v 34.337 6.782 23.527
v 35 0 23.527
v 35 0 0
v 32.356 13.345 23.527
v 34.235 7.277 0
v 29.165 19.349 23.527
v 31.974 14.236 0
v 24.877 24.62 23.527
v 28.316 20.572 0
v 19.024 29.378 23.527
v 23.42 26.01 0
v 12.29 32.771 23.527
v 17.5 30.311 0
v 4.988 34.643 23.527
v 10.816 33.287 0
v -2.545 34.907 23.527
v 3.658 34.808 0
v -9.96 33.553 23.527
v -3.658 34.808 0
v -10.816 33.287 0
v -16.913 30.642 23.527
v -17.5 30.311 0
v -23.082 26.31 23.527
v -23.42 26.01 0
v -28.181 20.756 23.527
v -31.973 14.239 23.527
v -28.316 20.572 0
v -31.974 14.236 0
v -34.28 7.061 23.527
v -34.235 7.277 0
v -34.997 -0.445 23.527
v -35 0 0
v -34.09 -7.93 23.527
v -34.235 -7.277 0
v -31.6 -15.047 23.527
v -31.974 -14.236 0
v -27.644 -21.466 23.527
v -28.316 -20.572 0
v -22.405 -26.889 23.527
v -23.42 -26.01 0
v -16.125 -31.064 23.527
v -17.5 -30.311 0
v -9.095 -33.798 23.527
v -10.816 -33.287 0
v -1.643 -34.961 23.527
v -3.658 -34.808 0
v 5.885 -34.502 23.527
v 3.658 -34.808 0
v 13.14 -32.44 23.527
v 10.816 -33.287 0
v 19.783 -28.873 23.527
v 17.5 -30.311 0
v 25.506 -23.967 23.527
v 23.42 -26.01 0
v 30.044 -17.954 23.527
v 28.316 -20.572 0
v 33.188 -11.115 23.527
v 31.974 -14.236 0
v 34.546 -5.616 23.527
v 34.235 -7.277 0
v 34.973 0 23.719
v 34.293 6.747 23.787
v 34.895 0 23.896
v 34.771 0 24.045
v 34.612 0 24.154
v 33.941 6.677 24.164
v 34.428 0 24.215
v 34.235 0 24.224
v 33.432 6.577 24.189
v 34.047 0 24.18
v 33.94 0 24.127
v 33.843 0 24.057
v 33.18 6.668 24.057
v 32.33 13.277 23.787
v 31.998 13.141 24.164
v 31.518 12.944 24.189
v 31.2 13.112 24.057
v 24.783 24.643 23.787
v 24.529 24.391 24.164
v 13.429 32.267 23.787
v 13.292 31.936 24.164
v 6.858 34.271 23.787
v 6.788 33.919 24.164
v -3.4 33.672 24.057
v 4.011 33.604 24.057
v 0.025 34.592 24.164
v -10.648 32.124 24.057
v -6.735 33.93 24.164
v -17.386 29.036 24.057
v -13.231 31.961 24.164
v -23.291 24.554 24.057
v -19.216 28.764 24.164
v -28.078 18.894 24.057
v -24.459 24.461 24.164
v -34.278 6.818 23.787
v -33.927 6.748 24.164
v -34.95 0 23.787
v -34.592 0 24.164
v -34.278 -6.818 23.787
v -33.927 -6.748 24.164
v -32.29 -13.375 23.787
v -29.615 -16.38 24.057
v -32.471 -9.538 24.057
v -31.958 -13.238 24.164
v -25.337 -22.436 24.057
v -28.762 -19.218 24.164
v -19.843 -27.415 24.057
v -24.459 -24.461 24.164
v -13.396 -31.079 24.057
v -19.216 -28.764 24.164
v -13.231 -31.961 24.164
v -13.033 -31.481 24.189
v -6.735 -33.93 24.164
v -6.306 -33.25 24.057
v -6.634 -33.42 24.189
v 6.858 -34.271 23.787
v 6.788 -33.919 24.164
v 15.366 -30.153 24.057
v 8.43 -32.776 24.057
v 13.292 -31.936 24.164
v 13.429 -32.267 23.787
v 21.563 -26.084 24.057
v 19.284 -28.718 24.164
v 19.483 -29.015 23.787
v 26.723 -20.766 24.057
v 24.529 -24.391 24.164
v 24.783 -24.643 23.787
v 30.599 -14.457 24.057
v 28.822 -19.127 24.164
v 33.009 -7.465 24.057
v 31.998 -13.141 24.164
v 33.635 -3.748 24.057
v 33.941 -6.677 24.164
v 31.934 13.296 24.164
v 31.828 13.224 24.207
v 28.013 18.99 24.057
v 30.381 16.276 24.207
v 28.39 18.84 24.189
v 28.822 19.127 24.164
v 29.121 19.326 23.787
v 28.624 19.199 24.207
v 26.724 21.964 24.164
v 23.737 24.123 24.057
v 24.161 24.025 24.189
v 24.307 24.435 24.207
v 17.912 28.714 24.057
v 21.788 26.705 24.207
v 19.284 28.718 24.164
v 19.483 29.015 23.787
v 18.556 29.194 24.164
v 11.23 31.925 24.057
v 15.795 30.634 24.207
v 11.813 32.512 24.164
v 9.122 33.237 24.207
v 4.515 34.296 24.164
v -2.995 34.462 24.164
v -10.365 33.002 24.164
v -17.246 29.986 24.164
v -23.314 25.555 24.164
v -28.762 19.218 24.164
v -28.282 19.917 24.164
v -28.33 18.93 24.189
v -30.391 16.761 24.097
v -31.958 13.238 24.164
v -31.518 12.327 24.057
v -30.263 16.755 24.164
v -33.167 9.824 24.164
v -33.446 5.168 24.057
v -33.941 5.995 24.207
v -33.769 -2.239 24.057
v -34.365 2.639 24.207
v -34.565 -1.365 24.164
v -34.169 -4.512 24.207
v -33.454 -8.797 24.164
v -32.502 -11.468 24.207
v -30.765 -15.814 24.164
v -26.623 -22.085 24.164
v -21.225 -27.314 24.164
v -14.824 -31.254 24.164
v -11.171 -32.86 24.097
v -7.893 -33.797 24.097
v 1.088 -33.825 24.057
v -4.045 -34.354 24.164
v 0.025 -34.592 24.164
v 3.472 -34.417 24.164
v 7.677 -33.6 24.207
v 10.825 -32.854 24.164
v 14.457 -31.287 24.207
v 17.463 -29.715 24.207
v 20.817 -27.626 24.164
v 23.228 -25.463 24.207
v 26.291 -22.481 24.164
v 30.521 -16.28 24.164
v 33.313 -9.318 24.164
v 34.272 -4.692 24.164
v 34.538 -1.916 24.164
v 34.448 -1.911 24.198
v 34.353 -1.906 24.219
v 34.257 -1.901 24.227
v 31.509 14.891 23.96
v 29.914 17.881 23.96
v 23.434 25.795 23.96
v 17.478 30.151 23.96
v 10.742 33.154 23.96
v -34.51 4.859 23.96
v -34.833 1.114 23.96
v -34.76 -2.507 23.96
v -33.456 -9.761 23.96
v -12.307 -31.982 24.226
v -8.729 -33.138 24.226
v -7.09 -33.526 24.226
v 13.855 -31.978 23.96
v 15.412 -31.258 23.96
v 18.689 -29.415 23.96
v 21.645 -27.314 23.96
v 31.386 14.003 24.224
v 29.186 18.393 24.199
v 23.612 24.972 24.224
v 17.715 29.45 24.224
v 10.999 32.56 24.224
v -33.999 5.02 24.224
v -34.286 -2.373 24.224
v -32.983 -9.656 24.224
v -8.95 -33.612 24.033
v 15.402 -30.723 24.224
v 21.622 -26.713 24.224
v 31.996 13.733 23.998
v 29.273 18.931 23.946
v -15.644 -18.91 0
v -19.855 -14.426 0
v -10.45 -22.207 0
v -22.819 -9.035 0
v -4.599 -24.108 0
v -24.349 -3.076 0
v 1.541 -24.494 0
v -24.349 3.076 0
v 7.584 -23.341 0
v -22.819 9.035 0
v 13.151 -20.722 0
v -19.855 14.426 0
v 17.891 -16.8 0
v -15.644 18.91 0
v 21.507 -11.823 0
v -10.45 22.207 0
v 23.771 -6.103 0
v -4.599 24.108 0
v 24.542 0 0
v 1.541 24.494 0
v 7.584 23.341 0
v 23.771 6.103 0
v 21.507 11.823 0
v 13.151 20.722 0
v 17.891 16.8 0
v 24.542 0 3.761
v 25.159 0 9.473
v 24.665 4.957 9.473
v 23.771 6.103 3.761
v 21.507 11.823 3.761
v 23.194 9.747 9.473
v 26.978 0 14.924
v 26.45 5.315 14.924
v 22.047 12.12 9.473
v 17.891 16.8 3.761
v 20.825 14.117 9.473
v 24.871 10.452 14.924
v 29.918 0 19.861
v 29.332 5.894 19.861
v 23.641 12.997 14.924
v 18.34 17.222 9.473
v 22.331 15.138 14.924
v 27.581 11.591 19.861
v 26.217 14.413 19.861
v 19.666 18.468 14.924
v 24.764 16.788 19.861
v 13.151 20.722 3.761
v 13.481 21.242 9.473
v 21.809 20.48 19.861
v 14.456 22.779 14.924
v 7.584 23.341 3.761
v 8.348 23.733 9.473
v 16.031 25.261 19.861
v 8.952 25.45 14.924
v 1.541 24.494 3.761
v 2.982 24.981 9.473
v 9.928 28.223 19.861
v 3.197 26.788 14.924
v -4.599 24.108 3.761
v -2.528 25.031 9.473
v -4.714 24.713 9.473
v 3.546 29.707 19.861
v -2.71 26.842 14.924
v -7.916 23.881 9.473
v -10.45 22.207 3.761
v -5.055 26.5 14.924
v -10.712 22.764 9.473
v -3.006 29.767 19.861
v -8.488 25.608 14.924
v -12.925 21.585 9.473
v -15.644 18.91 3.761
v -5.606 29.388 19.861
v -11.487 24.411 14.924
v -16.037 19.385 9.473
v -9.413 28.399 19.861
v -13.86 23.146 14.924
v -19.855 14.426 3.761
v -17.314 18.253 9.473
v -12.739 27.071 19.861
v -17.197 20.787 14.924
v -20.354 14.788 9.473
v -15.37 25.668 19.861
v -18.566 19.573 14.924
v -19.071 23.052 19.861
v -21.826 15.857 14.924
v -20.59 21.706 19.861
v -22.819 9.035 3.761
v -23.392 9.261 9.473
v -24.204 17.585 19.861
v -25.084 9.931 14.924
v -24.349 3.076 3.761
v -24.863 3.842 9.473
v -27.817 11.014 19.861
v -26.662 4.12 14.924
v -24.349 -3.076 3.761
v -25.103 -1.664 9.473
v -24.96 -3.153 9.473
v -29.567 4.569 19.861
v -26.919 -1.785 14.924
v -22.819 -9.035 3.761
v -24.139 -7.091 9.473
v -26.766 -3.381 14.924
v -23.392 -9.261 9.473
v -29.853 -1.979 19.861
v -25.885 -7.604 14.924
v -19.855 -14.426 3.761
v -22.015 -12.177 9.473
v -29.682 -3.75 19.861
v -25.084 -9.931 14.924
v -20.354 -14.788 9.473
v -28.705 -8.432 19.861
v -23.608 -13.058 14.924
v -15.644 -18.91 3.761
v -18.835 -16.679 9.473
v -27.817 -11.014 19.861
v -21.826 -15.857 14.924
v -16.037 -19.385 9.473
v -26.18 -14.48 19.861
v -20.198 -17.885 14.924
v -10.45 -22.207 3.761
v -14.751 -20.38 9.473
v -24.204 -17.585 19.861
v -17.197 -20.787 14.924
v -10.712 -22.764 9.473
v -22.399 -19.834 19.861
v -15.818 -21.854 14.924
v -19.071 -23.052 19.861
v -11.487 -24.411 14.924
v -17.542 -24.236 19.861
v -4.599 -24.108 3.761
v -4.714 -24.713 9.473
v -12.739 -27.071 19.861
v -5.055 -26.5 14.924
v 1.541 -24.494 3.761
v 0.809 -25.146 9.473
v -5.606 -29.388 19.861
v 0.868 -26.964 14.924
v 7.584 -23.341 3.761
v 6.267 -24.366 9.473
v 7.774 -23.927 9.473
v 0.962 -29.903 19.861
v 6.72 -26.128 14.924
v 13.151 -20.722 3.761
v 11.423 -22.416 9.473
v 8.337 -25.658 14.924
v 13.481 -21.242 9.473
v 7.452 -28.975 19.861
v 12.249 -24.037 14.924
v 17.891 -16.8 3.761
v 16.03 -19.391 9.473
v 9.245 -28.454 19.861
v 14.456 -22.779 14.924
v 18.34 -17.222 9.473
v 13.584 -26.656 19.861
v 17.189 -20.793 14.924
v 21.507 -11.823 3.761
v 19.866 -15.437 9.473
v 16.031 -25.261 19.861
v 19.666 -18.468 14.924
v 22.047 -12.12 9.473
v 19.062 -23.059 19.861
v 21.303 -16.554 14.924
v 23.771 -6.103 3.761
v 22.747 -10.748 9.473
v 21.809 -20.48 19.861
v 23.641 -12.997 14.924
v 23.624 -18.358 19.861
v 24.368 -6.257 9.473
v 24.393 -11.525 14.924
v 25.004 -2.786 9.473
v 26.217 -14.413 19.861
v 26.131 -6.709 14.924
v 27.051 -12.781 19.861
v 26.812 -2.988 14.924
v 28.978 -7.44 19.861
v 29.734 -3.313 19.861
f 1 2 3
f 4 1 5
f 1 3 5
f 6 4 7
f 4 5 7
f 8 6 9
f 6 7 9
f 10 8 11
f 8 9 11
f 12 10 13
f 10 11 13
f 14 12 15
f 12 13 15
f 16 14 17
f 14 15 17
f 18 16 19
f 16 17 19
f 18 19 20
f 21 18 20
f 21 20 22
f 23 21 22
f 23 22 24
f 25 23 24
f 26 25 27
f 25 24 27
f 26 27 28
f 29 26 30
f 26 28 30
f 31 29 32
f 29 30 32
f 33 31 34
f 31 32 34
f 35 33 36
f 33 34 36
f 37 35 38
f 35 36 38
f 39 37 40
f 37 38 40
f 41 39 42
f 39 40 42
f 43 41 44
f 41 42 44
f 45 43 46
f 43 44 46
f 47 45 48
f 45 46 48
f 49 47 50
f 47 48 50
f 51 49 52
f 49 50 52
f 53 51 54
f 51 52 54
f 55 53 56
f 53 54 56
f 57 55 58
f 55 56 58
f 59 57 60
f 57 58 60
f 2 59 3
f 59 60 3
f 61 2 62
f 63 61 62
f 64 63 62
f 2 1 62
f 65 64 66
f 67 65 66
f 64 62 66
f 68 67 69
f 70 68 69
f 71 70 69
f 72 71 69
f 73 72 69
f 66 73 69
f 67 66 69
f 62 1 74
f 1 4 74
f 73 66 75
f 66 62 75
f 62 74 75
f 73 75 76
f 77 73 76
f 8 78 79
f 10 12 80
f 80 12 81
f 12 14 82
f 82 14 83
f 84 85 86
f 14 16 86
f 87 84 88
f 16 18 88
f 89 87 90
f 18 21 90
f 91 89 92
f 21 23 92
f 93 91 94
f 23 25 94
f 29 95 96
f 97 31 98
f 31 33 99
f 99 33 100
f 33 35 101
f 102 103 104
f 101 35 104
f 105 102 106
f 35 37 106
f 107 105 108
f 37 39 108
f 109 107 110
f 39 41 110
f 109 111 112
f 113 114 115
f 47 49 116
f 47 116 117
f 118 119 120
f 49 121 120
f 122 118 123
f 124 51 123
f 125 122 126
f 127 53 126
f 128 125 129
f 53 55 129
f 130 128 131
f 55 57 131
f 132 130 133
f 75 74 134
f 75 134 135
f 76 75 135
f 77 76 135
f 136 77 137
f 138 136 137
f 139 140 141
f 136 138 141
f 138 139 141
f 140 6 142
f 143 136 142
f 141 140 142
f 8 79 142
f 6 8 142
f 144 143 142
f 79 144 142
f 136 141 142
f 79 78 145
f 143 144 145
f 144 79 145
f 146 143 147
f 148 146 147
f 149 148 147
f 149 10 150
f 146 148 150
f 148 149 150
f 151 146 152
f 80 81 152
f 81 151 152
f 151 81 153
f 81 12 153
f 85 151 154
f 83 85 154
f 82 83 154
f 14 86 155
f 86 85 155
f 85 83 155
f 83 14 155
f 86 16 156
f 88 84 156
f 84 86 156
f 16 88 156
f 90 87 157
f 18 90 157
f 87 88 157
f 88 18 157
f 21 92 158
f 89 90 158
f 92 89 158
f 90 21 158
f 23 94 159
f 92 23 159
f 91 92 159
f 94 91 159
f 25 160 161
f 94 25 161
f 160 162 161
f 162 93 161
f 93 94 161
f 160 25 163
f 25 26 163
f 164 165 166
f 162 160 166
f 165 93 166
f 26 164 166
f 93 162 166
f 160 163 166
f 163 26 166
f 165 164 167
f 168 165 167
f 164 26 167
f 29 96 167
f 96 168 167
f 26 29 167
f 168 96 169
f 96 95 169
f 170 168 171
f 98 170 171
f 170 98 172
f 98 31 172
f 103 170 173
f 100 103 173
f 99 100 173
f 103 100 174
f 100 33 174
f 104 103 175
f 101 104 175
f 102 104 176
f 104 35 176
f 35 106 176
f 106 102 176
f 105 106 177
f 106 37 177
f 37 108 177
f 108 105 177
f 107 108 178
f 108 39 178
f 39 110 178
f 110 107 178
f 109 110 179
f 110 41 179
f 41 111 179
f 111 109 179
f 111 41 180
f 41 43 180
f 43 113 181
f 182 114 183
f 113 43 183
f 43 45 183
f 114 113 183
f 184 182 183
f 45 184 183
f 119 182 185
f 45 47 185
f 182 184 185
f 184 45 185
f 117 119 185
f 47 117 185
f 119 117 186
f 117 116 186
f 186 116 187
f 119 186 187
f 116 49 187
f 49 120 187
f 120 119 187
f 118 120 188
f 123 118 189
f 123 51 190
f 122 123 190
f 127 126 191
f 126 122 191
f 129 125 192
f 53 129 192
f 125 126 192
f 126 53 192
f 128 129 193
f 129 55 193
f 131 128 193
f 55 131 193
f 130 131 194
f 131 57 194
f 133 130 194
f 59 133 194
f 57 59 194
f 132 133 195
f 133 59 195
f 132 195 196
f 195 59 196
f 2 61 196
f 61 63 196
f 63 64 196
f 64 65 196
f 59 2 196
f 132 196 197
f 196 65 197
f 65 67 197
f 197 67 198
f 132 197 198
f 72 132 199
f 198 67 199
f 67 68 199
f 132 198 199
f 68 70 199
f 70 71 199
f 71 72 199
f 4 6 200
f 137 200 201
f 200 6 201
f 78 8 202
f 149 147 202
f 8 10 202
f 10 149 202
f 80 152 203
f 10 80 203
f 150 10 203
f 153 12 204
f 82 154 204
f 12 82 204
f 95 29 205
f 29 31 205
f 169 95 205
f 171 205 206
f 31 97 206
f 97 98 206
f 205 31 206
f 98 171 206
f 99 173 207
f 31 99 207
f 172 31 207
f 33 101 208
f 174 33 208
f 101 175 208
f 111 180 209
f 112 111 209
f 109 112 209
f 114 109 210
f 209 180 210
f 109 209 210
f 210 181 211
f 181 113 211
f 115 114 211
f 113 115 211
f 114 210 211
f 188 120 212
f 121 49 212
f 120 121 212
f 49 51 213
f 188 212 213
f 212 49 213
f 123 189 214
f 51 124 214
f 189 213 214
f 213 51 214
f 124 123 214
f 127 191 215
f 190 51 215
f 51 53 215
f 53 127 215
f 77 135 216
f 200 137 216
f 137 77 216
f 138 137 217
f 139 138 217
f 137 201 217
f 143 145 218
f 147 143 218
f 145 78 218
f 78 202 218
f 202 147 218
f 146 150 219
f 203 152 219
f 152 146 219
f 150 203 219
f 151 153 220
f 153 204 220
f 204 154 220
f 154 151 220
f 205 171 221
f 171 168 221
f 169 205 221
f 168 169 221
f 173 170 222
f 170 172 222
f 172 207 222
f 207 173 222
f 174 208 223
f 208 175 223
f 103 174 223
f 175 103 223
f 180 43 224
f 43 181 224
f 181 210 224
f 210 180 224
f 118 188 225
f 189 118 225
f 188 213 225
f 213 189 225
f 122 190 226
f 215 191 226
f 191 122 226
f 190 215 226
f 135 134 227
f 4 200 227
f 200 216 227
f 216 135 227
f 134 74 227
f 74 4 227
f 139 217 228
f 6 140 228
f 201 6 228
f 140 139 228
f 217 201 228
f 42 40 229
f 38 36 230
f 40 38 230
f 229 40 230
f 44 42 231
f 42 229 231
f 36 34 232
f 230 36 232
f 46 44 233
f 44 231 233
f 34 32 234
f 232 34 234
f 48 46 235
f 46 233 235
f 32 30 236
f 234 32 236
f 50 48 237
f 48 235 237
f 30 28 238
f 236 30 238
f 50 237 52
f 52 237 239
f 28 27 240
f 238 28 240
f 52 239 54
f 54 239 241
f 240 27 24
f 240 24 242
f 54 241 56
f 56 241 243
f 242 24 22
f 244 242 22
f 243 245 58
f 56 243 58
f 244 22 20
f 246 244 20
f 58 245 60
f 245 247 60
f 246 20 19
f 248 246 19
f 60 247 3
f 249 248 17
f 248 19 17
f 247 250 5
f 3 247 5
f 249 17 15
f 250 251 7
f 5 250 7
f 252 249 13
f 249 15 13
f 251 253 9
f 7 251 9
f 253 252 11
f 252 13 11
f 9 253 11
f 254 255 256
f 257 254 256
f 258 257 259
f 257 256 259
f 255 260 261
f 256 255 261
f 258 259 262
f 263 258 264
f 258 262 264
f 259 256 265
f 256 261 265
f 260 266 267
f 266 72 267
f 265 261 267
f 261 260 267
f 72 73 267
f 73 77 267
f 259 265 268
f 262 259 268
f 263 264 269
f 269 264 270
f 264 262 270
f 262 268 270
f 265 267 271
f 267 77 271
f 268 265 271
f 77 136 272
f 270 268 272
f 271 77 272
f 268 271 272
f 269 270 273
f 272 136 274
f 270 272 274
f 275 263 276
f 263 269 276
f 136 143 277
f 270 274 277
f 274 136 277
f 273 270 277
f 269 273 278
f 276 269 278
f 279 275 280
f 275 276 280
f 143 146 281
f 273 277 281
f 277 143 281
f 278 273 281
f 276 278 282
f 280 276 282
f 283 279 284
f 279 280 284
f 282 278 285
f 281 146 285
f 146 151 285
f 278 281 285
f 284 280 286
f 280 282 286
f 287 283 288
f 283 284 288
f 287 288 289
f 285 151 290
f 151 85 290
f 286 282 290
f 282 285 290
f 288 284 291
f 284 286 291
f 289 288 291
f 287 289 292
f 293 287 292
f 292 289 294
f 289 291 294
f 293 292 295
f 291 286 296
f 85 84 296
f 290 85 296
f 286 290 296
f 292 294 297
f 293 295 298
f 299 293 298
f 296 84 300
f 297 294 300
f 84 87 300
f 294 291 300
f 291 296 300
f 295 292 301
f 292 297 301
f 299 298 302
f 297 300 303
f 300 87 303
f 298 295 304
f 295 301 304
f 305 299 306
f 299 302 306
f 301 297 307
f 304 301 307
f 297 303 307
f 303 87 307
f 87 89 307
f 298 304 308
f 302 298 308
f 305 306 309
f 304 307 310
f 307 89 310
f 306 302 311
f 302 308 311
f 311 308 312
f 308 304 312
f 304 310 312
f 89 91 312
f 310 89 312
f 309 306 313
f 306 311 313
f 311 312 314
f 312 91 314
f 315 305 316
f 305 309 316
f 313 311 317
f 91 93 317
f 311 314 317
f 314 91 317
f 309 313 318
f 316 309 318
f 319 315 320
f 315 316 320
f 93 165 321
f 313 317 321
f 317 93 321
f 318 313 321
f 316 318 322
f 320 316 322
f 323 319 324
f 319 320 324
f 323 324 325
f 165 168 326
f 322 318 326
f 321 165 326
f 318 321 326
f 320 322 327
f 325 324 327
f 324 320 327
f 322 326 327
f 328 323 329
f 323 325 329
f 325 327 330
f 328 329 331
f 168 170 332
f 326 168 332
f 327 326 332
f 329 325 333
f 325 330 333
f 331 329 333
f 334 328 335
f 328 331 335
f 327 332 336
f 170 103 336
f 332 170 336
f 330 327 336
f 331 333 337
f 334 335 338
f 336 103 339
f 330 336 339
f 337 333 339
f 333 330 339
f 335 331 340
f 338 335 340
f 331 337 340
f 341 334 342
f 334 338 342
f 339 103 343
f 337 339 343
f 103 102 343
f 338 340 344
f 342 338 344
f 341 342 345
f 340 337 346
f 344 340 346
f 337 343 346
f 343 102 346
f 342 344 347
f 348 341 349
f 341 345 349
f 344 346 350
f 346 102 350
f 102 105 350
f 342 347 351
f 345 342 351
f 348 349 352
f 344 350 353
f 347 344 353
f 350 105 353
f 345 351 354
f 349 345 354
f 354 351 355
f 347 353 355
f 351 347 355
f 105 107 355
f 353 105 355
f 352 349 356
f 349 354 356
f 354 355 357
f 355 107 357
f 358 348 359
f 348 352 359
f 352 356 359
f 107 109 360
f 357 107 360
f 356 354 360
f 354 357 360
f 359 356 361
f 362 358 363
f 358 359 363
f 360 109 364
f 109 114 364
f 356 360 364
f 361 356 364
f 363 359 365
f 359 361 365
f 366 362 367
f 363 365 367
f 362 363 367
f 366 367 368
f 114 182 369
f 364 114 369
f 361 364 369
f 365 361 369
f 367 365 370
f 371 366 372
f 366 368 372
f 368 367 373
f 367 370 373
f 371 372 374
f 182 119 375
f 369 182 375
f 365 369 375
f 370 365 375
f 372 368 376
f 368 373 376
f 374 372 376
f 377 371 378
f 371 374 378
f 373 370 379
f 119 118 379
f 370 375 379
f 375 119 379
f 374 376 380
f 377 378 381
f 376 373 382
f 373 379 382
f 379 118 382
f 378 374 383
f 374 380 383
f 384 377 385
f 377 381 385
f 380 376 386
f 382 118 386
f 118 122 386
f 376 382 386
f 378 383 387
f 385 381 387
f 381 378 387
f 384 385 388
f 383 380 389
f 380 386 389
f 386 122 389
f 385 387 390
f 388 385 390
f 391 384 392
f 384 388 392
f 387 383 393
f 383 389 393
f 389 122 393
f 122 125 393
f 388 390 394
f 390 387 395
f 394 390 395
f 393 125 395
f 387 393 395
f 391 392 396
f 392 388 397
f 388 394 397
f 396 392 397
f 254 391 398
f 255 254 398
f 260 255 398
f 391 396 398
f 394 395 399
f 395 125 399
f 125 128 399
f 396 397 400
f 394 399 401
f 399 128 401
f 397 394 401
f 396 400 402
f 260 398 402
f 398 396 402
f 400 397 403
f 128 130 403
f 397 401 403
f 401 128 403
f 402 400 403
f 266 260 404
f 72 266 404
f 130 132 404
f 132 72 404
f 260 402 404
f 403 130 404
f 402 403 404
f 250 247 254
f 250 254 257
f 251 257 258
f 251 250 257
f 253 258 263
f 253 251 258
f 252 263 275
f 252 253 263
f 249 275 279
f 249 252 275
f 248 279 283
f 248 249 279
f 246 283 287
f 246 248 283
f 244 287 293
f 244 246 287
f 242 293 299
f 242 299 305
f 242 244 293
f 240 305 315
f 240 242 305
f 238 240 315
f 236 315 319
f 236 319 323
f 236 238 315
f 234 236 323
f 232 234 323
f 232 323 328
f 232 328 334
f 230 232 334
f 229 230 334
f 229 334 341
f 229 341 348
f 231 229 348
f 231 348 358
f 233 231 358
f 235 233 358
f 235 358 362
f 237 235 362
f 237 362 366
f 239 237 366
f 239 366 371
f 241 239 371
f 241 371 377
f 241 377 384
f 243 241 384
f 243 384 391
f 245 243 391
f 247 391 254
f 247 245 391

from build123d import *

# Parameters (mm, degrees)
F0_R     = 35
F0_R_2   = 24.5425
F1_DEPTH = 25
F3_R     = 0.7


# Not quite as in the source:
# - a fillet or chamfer that OpenCascade refuses, or shapes differently, is made with other operations: its cross-section is extruded or revolved along the edge and cut away or added


with BuildPart() as f1:
    # F0 (on Top) → F1 (new body)
    with BuildSketch(Plane.XY):
        Circle(F0_R)
        Circle(F0_R_2, mode=Mode.SUBTRACT)
    extrude(amount=F1_DEPTH)

    # F2: fillet of radius 26.7977705423 on 1 edges, made by hand

    # F2_s1 → F2_t2 (revolve, cut)
    with BuildSketch(Plane.XZ):
        with BuildLine():
            ThreePointArc((24.5425, 3.7605069589), (27.2986053896, 15.5976874814), (35, 25))
            Line((35, 25), (34.6731945892, 25.4247898608))
            ThreePointArc((34.6731945892, 25.4247898608), (29.77125, 25.5359554108), (24.5425, 25.5359554108))
            Line((24.5425, 25.5359554108), (24.0065445892, 25))
            Line((24.0065445892, 25), (24.0065445892, 3.7605069589))
            Line((24.0065445892, 3.7605069589), (24.5425, 3.7605069589))
        make_face()
    revolve(axis=Axis((0, 0, 25), (0, 0, 1)), mode=Mode.SUBTRACT)

    # F3
    f3_edges = [f1.edges().sort_by_distance(p)[0] for p in [
        (-35, 0, 25),
    ]]
    fillet(f3_edges, radius=F3_R)


solid = f1.part
